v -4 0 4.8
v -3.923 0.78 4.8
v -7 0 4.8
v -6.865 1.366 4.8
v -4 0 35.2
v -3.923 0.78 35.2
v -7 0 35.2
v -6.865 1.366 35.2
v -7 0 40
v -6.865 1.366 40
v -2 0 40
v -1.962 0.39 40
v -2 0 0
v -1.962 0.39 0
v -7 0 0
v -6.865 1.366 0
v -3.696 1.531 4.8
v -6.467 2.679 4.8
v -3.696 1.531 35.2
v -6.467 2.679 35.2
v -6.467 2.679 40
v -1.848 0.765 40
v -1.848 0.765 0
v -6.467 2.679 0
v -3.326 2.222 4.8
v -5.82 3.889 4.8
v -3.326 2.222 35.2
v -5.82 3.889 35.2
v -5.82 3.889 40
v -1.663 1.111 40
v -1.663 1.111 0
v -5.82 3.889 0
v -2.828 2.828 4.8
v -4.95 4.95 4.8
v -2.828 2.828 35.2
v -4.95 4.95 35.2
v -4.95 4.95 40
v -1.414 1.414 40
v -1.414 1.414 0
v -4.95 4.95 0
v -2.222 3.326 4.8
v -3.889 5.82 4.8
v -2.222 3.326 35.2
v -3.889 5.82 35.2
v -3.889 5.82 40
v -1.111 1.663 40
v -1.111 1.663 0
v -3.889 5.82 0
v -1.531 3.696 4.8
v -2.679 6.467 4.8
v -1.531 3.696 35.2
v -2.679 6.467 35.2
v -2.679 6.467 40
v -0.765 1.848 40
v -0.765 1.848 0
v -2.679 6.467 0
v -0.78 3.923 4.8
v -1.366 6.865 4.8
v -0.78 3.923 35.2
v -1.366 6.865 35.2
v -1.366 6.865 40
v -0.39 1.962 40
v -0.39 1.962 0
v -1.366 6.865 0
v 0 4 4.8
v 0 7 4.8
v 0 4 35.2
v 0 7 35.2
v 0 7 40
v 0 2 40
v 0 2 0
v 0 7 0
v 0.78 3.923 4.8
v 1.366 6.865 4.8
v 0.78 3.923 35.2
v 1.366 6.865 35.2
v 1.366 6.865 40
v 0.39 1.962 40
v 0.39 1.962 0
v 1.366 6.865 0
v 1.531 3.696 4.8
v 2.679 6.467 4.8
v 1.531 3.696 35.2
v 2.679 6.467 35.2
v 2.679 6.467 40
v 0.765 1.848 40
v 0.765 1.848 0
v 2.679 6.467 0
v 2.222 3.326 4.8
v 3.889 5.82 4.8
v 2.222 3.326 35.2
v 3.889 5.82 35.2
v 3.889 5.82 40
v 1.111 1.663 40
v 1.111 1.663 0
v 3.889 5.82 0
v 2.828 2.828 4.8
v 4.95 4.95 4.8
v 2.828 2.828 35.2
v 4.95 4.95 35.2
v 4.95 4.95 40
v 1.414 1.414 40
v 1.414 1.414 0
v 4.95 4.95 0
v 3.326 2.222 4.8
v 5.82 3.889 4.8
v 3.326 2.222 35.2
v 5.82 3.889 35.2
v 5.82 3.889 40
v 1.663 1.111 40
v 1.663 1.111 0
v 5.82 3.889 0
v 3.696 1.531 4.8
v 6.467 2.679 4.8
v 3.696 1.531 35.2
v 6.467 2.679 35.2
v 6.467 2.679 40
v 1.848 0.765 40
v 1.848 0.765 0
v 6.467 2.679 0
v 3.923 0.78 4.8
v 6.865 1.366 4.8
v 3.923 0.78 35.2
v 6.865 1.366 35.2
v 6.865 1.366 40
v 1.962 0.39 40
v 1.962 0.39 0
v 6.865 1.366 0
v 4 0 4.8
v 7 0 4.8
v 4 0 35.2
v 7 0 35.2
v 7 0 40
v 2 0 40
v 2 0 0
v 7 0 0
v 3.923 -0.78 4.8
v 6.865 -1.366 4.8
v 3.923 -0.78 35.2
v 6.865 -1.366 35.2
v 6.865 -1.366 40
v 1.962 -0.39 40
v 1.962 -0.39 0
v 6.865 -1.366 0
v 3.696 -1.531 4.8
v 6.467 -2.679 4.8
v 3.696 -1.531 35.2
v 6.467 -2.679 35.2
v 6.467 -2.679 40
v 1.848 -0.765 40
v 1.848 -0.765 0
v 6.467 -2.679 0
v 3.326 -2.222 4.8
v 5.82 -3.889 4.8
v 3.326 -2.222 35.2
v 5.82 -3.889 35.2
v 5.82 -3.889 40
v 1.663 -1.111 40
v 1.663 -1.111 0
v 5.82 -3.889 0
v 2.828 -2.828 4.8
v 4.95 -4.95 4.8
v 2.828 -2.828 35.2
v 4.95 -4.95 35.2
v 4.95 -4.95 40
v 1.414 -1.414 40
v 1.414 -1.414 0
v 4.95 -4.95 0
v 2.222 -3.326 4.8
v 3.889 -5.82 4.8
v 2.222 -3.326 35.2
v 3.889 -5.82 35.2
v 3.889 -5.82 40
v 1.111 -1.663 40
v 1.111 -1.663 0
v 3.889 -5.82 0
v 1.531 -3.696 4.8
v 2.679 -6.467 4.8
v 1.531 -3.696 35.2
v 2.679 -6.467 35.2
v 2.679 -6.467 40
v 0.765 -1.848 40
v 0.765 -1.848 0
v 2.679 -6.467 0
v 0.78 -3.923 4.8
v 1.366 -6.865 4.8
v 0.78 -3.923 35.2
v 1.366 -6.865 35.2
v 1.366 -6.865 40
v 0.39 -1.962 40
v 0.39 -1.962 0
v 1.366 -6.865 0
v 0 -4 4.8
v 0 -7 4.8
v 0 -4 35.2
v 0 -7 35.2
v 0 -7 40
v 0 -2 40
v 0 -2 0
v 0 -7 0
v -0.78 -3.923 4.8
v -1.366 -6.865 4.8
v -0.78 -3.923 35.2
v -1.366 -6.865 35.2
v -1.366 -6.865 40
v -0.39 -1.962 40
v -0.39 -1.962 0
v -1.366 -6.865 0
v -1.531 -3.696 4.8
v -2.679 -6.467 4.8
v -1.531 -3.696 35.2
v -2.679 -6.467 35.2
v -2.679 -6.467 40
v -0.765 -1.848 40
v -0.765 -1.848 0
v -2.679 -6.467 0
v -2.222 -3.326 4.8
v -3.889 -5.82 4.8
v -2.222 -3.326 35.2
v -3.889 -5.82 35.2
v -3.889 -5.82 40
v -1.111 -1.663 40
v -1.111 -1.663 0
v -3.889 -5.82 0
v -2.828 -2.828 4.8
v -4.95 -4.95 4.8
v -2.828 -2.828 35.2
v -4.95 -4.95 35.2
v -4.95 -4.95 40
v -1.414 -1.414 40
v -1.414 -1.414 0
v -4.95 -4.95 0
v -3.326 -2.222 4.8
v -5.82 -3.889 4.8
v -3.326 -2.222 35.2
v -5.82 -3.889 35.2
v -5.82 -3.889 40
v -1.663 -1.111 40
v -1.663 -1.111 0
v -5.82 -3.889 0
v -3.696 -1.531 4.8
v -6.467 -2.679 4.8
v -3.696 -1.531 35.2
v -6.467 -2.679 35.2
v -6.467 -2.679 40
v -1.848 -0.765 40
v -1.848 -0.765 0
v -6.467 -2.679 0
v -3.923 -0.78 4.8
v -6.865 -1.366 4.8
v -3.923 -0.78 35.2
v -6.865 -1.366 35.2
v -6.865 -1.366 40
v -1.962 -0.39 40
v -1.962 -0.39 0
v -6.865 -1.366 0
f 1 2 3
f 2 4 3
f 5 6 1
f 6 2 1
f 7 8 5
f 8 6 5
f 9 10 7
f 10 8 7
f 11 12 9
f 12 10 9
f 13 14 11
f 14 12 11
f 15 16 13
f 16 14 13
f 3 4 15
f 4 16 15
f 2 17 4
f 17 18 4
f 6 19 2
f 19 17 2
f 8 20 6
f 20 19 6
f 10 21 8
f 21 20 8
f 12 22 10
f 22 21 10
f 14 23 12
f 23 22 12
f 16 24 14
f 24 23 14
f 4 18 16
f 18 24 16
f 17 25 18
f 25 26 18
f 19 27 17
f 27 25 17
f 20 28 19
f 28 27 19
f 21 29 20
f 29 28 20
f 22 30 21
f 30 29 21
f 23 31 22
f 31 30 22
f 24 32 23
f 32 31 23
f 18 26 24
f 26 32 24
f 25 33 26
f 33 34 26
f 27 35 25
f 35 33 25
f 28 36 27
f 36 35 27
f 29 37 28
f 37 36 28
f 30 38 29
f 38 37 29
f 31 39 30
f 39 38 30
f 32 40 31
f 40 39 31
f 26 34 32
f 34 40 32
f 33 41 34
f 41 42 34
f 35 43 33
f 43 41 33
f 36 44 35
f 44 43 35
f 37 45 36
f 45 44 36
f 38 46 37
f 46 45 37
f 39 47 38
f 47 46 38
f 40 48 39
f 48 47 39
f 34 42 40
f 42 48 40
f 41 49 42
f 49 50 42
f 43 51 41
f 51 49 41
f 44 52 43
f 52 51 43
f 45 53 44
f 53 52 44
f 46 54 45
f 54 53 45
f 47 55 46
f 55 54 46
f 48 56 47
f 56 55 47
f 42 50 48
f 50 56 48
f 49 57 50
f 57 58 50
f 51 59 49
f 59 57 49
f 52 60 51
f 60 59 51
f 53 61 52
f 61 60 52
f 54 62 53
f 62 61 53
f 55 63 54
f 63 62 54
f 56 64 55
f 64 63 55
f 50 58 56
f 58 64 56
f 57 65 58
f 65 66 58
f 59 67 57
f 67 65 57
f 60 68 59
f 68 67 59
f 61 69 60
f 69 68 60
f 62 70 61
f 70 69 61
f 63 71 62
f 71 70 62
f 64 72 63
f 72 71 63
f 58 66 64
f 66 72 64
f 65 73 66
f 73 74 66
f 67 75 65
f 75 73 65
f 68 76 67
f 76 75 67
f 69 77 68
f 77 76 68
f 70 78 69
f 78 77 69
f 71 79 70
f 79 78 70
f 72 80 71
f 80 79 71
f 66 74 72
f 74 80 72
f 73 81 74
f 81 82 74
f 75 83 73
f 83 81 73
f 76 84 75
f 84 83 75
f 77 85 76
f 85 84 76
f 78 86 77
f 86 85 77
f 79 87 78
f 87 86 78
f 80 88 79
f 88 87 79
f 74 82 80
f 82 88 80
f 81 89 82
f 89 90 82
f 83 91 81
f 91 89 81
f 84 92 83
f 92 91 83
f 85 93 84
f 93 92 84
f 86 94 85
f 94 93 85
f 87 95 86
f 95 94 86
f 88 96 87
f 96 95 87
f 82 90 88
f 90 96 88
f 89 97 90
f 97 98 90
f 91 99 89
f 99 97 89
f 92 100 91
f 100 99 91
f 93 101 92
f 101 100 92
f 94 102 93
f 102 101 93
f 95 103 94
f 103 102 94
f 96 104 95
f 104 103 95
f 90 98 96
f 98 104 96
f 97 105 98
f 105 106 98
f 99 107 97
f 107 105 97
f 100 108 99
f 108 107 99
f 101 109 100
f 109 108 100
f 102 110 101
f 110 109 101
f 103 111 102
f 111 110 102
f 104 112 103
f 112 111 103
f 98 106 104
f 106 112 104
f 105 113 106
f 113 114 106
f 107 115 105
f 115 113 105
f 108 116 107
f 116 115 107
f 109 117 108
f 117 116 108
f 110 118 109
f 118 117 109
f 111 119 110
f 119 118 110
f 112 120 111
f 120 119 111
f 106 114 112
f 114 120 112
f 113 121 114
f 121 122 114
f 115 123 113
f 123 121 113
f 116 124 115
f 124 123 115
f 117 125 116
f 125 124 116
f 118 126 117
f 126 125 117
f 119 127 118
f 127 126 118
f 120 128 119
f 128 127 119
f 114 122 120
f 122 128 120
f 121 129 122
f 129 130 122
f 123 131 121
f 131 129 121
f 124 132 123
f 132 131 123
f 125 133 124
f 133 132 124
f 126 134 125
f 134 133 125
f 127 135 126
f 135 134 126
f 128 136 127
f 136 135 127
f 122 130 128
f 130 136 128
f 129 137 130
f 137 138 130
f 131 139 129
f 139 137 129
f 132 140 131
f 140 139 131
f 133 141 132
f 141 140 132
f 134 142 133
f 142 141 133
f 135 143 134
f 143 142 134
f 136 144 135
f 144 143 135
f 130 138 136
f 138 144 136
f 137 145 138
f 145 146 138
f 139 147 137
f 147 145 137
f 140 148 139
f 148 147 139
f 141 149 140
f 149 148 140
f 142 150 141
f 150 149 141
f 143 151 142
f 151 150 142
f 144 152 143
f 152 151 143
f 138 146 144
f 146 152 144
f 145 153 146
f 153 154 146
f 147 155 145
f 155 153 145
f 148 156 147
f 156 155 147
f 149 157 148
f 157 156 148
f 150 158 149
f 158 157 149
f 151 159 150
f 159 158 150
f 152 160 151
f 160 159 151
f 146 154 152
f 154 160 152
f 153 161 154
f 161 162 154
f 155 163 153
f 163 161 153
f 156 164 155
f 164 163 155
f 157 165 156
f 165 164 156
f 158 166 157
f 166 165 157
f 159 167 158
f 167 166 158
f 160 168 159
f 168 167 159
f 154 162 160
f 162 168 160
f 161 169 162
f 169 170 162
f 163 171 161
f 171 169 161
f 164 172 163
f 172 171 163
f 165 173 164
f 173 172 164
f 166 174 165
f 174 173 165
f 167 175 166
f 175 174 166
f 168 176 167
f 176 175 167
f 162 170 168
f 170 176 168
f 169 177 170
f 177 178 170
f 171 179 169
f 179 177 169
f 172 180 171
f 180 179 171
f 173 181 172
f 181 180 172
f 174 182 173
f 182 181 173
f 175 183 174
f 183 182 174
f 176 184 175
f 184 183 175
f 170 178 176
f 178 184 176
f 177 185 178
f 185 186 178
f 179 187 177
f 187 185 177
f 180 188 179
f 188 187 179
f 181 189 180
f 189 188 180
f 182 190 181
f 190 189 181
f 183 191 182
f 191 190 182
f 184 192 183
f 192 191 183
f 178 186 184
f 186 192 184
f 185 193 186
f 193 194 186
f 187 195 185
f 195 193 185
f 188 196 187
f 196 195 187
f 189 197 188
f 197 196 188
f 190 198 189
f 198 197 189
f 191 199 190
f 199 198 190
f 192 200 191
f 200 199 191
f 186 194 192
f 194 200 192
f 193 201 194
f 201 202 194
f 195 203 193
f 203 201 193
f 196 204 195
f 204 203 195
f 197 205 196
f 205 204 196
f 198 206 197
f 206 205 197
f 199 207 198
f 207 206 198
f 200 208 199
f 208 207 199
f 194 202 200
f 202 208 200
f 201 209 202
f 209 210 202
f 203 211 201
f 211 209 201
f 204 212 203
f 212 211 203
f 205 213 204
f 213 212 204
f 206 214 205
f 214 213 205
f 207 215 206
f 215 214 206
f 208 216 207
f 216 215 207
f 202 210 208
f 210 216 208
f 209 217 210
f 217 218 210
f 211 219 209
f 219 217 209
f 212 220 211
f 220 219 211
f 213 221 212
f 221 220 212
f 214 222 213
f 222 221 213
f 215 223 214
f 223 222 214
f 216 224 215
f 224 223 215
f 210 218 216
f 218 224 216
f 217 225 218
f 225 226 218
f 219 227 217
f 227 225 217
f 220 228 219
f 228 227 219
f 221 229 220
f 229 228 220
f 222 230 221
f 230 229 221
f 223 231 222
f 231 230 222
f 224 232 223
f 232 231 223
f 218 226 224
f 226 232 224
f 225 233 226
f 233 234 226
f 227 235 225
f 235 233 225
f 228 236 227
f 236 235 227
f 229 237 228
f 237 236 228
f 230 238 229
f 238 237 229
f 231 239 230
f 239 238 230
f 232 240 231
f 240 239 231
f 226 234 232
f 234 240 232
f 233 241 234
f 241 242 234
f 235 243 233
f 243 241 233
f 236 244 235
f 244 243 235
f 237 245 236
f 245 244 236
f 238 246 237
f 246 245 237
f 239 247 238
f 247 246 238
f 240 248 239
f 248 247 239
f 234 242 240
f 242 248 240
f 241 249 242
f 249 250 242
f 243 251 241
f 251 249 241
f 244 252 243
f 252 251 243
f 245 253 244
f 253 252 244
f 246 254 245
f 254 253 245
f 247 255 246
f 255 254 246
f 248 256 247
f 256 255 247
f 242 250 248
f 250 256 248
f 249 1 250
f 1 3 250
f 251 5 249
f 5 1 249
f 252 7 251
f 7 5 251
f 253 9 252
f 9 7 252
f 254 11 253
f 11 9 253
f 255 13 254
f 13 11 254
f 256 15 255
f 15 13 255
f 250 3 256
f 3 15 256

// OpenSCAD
$fn = 32;

// ----------------------------------------------------------------------
// Profiled standoff: spool spacer, 40 mm long, bore 4 mm
// ----------------------------------------------------------------------

// --- parameters (mm) ---
revolve_angle = 360;      // full turn around the Z axis
profile_points = 8;       // points of the closed outline

profile = [[2, 0], [7, 0], [7, 4.8], [4, 4.8], [4, 35.2], [7, 35.2], [7, 40], [2, 40]];  // single closed polygon, 8 points, counter clockwise

// --- the one profile operation ---
rotate_extrude(angle = revolve_angle) polygon(points = profile);
